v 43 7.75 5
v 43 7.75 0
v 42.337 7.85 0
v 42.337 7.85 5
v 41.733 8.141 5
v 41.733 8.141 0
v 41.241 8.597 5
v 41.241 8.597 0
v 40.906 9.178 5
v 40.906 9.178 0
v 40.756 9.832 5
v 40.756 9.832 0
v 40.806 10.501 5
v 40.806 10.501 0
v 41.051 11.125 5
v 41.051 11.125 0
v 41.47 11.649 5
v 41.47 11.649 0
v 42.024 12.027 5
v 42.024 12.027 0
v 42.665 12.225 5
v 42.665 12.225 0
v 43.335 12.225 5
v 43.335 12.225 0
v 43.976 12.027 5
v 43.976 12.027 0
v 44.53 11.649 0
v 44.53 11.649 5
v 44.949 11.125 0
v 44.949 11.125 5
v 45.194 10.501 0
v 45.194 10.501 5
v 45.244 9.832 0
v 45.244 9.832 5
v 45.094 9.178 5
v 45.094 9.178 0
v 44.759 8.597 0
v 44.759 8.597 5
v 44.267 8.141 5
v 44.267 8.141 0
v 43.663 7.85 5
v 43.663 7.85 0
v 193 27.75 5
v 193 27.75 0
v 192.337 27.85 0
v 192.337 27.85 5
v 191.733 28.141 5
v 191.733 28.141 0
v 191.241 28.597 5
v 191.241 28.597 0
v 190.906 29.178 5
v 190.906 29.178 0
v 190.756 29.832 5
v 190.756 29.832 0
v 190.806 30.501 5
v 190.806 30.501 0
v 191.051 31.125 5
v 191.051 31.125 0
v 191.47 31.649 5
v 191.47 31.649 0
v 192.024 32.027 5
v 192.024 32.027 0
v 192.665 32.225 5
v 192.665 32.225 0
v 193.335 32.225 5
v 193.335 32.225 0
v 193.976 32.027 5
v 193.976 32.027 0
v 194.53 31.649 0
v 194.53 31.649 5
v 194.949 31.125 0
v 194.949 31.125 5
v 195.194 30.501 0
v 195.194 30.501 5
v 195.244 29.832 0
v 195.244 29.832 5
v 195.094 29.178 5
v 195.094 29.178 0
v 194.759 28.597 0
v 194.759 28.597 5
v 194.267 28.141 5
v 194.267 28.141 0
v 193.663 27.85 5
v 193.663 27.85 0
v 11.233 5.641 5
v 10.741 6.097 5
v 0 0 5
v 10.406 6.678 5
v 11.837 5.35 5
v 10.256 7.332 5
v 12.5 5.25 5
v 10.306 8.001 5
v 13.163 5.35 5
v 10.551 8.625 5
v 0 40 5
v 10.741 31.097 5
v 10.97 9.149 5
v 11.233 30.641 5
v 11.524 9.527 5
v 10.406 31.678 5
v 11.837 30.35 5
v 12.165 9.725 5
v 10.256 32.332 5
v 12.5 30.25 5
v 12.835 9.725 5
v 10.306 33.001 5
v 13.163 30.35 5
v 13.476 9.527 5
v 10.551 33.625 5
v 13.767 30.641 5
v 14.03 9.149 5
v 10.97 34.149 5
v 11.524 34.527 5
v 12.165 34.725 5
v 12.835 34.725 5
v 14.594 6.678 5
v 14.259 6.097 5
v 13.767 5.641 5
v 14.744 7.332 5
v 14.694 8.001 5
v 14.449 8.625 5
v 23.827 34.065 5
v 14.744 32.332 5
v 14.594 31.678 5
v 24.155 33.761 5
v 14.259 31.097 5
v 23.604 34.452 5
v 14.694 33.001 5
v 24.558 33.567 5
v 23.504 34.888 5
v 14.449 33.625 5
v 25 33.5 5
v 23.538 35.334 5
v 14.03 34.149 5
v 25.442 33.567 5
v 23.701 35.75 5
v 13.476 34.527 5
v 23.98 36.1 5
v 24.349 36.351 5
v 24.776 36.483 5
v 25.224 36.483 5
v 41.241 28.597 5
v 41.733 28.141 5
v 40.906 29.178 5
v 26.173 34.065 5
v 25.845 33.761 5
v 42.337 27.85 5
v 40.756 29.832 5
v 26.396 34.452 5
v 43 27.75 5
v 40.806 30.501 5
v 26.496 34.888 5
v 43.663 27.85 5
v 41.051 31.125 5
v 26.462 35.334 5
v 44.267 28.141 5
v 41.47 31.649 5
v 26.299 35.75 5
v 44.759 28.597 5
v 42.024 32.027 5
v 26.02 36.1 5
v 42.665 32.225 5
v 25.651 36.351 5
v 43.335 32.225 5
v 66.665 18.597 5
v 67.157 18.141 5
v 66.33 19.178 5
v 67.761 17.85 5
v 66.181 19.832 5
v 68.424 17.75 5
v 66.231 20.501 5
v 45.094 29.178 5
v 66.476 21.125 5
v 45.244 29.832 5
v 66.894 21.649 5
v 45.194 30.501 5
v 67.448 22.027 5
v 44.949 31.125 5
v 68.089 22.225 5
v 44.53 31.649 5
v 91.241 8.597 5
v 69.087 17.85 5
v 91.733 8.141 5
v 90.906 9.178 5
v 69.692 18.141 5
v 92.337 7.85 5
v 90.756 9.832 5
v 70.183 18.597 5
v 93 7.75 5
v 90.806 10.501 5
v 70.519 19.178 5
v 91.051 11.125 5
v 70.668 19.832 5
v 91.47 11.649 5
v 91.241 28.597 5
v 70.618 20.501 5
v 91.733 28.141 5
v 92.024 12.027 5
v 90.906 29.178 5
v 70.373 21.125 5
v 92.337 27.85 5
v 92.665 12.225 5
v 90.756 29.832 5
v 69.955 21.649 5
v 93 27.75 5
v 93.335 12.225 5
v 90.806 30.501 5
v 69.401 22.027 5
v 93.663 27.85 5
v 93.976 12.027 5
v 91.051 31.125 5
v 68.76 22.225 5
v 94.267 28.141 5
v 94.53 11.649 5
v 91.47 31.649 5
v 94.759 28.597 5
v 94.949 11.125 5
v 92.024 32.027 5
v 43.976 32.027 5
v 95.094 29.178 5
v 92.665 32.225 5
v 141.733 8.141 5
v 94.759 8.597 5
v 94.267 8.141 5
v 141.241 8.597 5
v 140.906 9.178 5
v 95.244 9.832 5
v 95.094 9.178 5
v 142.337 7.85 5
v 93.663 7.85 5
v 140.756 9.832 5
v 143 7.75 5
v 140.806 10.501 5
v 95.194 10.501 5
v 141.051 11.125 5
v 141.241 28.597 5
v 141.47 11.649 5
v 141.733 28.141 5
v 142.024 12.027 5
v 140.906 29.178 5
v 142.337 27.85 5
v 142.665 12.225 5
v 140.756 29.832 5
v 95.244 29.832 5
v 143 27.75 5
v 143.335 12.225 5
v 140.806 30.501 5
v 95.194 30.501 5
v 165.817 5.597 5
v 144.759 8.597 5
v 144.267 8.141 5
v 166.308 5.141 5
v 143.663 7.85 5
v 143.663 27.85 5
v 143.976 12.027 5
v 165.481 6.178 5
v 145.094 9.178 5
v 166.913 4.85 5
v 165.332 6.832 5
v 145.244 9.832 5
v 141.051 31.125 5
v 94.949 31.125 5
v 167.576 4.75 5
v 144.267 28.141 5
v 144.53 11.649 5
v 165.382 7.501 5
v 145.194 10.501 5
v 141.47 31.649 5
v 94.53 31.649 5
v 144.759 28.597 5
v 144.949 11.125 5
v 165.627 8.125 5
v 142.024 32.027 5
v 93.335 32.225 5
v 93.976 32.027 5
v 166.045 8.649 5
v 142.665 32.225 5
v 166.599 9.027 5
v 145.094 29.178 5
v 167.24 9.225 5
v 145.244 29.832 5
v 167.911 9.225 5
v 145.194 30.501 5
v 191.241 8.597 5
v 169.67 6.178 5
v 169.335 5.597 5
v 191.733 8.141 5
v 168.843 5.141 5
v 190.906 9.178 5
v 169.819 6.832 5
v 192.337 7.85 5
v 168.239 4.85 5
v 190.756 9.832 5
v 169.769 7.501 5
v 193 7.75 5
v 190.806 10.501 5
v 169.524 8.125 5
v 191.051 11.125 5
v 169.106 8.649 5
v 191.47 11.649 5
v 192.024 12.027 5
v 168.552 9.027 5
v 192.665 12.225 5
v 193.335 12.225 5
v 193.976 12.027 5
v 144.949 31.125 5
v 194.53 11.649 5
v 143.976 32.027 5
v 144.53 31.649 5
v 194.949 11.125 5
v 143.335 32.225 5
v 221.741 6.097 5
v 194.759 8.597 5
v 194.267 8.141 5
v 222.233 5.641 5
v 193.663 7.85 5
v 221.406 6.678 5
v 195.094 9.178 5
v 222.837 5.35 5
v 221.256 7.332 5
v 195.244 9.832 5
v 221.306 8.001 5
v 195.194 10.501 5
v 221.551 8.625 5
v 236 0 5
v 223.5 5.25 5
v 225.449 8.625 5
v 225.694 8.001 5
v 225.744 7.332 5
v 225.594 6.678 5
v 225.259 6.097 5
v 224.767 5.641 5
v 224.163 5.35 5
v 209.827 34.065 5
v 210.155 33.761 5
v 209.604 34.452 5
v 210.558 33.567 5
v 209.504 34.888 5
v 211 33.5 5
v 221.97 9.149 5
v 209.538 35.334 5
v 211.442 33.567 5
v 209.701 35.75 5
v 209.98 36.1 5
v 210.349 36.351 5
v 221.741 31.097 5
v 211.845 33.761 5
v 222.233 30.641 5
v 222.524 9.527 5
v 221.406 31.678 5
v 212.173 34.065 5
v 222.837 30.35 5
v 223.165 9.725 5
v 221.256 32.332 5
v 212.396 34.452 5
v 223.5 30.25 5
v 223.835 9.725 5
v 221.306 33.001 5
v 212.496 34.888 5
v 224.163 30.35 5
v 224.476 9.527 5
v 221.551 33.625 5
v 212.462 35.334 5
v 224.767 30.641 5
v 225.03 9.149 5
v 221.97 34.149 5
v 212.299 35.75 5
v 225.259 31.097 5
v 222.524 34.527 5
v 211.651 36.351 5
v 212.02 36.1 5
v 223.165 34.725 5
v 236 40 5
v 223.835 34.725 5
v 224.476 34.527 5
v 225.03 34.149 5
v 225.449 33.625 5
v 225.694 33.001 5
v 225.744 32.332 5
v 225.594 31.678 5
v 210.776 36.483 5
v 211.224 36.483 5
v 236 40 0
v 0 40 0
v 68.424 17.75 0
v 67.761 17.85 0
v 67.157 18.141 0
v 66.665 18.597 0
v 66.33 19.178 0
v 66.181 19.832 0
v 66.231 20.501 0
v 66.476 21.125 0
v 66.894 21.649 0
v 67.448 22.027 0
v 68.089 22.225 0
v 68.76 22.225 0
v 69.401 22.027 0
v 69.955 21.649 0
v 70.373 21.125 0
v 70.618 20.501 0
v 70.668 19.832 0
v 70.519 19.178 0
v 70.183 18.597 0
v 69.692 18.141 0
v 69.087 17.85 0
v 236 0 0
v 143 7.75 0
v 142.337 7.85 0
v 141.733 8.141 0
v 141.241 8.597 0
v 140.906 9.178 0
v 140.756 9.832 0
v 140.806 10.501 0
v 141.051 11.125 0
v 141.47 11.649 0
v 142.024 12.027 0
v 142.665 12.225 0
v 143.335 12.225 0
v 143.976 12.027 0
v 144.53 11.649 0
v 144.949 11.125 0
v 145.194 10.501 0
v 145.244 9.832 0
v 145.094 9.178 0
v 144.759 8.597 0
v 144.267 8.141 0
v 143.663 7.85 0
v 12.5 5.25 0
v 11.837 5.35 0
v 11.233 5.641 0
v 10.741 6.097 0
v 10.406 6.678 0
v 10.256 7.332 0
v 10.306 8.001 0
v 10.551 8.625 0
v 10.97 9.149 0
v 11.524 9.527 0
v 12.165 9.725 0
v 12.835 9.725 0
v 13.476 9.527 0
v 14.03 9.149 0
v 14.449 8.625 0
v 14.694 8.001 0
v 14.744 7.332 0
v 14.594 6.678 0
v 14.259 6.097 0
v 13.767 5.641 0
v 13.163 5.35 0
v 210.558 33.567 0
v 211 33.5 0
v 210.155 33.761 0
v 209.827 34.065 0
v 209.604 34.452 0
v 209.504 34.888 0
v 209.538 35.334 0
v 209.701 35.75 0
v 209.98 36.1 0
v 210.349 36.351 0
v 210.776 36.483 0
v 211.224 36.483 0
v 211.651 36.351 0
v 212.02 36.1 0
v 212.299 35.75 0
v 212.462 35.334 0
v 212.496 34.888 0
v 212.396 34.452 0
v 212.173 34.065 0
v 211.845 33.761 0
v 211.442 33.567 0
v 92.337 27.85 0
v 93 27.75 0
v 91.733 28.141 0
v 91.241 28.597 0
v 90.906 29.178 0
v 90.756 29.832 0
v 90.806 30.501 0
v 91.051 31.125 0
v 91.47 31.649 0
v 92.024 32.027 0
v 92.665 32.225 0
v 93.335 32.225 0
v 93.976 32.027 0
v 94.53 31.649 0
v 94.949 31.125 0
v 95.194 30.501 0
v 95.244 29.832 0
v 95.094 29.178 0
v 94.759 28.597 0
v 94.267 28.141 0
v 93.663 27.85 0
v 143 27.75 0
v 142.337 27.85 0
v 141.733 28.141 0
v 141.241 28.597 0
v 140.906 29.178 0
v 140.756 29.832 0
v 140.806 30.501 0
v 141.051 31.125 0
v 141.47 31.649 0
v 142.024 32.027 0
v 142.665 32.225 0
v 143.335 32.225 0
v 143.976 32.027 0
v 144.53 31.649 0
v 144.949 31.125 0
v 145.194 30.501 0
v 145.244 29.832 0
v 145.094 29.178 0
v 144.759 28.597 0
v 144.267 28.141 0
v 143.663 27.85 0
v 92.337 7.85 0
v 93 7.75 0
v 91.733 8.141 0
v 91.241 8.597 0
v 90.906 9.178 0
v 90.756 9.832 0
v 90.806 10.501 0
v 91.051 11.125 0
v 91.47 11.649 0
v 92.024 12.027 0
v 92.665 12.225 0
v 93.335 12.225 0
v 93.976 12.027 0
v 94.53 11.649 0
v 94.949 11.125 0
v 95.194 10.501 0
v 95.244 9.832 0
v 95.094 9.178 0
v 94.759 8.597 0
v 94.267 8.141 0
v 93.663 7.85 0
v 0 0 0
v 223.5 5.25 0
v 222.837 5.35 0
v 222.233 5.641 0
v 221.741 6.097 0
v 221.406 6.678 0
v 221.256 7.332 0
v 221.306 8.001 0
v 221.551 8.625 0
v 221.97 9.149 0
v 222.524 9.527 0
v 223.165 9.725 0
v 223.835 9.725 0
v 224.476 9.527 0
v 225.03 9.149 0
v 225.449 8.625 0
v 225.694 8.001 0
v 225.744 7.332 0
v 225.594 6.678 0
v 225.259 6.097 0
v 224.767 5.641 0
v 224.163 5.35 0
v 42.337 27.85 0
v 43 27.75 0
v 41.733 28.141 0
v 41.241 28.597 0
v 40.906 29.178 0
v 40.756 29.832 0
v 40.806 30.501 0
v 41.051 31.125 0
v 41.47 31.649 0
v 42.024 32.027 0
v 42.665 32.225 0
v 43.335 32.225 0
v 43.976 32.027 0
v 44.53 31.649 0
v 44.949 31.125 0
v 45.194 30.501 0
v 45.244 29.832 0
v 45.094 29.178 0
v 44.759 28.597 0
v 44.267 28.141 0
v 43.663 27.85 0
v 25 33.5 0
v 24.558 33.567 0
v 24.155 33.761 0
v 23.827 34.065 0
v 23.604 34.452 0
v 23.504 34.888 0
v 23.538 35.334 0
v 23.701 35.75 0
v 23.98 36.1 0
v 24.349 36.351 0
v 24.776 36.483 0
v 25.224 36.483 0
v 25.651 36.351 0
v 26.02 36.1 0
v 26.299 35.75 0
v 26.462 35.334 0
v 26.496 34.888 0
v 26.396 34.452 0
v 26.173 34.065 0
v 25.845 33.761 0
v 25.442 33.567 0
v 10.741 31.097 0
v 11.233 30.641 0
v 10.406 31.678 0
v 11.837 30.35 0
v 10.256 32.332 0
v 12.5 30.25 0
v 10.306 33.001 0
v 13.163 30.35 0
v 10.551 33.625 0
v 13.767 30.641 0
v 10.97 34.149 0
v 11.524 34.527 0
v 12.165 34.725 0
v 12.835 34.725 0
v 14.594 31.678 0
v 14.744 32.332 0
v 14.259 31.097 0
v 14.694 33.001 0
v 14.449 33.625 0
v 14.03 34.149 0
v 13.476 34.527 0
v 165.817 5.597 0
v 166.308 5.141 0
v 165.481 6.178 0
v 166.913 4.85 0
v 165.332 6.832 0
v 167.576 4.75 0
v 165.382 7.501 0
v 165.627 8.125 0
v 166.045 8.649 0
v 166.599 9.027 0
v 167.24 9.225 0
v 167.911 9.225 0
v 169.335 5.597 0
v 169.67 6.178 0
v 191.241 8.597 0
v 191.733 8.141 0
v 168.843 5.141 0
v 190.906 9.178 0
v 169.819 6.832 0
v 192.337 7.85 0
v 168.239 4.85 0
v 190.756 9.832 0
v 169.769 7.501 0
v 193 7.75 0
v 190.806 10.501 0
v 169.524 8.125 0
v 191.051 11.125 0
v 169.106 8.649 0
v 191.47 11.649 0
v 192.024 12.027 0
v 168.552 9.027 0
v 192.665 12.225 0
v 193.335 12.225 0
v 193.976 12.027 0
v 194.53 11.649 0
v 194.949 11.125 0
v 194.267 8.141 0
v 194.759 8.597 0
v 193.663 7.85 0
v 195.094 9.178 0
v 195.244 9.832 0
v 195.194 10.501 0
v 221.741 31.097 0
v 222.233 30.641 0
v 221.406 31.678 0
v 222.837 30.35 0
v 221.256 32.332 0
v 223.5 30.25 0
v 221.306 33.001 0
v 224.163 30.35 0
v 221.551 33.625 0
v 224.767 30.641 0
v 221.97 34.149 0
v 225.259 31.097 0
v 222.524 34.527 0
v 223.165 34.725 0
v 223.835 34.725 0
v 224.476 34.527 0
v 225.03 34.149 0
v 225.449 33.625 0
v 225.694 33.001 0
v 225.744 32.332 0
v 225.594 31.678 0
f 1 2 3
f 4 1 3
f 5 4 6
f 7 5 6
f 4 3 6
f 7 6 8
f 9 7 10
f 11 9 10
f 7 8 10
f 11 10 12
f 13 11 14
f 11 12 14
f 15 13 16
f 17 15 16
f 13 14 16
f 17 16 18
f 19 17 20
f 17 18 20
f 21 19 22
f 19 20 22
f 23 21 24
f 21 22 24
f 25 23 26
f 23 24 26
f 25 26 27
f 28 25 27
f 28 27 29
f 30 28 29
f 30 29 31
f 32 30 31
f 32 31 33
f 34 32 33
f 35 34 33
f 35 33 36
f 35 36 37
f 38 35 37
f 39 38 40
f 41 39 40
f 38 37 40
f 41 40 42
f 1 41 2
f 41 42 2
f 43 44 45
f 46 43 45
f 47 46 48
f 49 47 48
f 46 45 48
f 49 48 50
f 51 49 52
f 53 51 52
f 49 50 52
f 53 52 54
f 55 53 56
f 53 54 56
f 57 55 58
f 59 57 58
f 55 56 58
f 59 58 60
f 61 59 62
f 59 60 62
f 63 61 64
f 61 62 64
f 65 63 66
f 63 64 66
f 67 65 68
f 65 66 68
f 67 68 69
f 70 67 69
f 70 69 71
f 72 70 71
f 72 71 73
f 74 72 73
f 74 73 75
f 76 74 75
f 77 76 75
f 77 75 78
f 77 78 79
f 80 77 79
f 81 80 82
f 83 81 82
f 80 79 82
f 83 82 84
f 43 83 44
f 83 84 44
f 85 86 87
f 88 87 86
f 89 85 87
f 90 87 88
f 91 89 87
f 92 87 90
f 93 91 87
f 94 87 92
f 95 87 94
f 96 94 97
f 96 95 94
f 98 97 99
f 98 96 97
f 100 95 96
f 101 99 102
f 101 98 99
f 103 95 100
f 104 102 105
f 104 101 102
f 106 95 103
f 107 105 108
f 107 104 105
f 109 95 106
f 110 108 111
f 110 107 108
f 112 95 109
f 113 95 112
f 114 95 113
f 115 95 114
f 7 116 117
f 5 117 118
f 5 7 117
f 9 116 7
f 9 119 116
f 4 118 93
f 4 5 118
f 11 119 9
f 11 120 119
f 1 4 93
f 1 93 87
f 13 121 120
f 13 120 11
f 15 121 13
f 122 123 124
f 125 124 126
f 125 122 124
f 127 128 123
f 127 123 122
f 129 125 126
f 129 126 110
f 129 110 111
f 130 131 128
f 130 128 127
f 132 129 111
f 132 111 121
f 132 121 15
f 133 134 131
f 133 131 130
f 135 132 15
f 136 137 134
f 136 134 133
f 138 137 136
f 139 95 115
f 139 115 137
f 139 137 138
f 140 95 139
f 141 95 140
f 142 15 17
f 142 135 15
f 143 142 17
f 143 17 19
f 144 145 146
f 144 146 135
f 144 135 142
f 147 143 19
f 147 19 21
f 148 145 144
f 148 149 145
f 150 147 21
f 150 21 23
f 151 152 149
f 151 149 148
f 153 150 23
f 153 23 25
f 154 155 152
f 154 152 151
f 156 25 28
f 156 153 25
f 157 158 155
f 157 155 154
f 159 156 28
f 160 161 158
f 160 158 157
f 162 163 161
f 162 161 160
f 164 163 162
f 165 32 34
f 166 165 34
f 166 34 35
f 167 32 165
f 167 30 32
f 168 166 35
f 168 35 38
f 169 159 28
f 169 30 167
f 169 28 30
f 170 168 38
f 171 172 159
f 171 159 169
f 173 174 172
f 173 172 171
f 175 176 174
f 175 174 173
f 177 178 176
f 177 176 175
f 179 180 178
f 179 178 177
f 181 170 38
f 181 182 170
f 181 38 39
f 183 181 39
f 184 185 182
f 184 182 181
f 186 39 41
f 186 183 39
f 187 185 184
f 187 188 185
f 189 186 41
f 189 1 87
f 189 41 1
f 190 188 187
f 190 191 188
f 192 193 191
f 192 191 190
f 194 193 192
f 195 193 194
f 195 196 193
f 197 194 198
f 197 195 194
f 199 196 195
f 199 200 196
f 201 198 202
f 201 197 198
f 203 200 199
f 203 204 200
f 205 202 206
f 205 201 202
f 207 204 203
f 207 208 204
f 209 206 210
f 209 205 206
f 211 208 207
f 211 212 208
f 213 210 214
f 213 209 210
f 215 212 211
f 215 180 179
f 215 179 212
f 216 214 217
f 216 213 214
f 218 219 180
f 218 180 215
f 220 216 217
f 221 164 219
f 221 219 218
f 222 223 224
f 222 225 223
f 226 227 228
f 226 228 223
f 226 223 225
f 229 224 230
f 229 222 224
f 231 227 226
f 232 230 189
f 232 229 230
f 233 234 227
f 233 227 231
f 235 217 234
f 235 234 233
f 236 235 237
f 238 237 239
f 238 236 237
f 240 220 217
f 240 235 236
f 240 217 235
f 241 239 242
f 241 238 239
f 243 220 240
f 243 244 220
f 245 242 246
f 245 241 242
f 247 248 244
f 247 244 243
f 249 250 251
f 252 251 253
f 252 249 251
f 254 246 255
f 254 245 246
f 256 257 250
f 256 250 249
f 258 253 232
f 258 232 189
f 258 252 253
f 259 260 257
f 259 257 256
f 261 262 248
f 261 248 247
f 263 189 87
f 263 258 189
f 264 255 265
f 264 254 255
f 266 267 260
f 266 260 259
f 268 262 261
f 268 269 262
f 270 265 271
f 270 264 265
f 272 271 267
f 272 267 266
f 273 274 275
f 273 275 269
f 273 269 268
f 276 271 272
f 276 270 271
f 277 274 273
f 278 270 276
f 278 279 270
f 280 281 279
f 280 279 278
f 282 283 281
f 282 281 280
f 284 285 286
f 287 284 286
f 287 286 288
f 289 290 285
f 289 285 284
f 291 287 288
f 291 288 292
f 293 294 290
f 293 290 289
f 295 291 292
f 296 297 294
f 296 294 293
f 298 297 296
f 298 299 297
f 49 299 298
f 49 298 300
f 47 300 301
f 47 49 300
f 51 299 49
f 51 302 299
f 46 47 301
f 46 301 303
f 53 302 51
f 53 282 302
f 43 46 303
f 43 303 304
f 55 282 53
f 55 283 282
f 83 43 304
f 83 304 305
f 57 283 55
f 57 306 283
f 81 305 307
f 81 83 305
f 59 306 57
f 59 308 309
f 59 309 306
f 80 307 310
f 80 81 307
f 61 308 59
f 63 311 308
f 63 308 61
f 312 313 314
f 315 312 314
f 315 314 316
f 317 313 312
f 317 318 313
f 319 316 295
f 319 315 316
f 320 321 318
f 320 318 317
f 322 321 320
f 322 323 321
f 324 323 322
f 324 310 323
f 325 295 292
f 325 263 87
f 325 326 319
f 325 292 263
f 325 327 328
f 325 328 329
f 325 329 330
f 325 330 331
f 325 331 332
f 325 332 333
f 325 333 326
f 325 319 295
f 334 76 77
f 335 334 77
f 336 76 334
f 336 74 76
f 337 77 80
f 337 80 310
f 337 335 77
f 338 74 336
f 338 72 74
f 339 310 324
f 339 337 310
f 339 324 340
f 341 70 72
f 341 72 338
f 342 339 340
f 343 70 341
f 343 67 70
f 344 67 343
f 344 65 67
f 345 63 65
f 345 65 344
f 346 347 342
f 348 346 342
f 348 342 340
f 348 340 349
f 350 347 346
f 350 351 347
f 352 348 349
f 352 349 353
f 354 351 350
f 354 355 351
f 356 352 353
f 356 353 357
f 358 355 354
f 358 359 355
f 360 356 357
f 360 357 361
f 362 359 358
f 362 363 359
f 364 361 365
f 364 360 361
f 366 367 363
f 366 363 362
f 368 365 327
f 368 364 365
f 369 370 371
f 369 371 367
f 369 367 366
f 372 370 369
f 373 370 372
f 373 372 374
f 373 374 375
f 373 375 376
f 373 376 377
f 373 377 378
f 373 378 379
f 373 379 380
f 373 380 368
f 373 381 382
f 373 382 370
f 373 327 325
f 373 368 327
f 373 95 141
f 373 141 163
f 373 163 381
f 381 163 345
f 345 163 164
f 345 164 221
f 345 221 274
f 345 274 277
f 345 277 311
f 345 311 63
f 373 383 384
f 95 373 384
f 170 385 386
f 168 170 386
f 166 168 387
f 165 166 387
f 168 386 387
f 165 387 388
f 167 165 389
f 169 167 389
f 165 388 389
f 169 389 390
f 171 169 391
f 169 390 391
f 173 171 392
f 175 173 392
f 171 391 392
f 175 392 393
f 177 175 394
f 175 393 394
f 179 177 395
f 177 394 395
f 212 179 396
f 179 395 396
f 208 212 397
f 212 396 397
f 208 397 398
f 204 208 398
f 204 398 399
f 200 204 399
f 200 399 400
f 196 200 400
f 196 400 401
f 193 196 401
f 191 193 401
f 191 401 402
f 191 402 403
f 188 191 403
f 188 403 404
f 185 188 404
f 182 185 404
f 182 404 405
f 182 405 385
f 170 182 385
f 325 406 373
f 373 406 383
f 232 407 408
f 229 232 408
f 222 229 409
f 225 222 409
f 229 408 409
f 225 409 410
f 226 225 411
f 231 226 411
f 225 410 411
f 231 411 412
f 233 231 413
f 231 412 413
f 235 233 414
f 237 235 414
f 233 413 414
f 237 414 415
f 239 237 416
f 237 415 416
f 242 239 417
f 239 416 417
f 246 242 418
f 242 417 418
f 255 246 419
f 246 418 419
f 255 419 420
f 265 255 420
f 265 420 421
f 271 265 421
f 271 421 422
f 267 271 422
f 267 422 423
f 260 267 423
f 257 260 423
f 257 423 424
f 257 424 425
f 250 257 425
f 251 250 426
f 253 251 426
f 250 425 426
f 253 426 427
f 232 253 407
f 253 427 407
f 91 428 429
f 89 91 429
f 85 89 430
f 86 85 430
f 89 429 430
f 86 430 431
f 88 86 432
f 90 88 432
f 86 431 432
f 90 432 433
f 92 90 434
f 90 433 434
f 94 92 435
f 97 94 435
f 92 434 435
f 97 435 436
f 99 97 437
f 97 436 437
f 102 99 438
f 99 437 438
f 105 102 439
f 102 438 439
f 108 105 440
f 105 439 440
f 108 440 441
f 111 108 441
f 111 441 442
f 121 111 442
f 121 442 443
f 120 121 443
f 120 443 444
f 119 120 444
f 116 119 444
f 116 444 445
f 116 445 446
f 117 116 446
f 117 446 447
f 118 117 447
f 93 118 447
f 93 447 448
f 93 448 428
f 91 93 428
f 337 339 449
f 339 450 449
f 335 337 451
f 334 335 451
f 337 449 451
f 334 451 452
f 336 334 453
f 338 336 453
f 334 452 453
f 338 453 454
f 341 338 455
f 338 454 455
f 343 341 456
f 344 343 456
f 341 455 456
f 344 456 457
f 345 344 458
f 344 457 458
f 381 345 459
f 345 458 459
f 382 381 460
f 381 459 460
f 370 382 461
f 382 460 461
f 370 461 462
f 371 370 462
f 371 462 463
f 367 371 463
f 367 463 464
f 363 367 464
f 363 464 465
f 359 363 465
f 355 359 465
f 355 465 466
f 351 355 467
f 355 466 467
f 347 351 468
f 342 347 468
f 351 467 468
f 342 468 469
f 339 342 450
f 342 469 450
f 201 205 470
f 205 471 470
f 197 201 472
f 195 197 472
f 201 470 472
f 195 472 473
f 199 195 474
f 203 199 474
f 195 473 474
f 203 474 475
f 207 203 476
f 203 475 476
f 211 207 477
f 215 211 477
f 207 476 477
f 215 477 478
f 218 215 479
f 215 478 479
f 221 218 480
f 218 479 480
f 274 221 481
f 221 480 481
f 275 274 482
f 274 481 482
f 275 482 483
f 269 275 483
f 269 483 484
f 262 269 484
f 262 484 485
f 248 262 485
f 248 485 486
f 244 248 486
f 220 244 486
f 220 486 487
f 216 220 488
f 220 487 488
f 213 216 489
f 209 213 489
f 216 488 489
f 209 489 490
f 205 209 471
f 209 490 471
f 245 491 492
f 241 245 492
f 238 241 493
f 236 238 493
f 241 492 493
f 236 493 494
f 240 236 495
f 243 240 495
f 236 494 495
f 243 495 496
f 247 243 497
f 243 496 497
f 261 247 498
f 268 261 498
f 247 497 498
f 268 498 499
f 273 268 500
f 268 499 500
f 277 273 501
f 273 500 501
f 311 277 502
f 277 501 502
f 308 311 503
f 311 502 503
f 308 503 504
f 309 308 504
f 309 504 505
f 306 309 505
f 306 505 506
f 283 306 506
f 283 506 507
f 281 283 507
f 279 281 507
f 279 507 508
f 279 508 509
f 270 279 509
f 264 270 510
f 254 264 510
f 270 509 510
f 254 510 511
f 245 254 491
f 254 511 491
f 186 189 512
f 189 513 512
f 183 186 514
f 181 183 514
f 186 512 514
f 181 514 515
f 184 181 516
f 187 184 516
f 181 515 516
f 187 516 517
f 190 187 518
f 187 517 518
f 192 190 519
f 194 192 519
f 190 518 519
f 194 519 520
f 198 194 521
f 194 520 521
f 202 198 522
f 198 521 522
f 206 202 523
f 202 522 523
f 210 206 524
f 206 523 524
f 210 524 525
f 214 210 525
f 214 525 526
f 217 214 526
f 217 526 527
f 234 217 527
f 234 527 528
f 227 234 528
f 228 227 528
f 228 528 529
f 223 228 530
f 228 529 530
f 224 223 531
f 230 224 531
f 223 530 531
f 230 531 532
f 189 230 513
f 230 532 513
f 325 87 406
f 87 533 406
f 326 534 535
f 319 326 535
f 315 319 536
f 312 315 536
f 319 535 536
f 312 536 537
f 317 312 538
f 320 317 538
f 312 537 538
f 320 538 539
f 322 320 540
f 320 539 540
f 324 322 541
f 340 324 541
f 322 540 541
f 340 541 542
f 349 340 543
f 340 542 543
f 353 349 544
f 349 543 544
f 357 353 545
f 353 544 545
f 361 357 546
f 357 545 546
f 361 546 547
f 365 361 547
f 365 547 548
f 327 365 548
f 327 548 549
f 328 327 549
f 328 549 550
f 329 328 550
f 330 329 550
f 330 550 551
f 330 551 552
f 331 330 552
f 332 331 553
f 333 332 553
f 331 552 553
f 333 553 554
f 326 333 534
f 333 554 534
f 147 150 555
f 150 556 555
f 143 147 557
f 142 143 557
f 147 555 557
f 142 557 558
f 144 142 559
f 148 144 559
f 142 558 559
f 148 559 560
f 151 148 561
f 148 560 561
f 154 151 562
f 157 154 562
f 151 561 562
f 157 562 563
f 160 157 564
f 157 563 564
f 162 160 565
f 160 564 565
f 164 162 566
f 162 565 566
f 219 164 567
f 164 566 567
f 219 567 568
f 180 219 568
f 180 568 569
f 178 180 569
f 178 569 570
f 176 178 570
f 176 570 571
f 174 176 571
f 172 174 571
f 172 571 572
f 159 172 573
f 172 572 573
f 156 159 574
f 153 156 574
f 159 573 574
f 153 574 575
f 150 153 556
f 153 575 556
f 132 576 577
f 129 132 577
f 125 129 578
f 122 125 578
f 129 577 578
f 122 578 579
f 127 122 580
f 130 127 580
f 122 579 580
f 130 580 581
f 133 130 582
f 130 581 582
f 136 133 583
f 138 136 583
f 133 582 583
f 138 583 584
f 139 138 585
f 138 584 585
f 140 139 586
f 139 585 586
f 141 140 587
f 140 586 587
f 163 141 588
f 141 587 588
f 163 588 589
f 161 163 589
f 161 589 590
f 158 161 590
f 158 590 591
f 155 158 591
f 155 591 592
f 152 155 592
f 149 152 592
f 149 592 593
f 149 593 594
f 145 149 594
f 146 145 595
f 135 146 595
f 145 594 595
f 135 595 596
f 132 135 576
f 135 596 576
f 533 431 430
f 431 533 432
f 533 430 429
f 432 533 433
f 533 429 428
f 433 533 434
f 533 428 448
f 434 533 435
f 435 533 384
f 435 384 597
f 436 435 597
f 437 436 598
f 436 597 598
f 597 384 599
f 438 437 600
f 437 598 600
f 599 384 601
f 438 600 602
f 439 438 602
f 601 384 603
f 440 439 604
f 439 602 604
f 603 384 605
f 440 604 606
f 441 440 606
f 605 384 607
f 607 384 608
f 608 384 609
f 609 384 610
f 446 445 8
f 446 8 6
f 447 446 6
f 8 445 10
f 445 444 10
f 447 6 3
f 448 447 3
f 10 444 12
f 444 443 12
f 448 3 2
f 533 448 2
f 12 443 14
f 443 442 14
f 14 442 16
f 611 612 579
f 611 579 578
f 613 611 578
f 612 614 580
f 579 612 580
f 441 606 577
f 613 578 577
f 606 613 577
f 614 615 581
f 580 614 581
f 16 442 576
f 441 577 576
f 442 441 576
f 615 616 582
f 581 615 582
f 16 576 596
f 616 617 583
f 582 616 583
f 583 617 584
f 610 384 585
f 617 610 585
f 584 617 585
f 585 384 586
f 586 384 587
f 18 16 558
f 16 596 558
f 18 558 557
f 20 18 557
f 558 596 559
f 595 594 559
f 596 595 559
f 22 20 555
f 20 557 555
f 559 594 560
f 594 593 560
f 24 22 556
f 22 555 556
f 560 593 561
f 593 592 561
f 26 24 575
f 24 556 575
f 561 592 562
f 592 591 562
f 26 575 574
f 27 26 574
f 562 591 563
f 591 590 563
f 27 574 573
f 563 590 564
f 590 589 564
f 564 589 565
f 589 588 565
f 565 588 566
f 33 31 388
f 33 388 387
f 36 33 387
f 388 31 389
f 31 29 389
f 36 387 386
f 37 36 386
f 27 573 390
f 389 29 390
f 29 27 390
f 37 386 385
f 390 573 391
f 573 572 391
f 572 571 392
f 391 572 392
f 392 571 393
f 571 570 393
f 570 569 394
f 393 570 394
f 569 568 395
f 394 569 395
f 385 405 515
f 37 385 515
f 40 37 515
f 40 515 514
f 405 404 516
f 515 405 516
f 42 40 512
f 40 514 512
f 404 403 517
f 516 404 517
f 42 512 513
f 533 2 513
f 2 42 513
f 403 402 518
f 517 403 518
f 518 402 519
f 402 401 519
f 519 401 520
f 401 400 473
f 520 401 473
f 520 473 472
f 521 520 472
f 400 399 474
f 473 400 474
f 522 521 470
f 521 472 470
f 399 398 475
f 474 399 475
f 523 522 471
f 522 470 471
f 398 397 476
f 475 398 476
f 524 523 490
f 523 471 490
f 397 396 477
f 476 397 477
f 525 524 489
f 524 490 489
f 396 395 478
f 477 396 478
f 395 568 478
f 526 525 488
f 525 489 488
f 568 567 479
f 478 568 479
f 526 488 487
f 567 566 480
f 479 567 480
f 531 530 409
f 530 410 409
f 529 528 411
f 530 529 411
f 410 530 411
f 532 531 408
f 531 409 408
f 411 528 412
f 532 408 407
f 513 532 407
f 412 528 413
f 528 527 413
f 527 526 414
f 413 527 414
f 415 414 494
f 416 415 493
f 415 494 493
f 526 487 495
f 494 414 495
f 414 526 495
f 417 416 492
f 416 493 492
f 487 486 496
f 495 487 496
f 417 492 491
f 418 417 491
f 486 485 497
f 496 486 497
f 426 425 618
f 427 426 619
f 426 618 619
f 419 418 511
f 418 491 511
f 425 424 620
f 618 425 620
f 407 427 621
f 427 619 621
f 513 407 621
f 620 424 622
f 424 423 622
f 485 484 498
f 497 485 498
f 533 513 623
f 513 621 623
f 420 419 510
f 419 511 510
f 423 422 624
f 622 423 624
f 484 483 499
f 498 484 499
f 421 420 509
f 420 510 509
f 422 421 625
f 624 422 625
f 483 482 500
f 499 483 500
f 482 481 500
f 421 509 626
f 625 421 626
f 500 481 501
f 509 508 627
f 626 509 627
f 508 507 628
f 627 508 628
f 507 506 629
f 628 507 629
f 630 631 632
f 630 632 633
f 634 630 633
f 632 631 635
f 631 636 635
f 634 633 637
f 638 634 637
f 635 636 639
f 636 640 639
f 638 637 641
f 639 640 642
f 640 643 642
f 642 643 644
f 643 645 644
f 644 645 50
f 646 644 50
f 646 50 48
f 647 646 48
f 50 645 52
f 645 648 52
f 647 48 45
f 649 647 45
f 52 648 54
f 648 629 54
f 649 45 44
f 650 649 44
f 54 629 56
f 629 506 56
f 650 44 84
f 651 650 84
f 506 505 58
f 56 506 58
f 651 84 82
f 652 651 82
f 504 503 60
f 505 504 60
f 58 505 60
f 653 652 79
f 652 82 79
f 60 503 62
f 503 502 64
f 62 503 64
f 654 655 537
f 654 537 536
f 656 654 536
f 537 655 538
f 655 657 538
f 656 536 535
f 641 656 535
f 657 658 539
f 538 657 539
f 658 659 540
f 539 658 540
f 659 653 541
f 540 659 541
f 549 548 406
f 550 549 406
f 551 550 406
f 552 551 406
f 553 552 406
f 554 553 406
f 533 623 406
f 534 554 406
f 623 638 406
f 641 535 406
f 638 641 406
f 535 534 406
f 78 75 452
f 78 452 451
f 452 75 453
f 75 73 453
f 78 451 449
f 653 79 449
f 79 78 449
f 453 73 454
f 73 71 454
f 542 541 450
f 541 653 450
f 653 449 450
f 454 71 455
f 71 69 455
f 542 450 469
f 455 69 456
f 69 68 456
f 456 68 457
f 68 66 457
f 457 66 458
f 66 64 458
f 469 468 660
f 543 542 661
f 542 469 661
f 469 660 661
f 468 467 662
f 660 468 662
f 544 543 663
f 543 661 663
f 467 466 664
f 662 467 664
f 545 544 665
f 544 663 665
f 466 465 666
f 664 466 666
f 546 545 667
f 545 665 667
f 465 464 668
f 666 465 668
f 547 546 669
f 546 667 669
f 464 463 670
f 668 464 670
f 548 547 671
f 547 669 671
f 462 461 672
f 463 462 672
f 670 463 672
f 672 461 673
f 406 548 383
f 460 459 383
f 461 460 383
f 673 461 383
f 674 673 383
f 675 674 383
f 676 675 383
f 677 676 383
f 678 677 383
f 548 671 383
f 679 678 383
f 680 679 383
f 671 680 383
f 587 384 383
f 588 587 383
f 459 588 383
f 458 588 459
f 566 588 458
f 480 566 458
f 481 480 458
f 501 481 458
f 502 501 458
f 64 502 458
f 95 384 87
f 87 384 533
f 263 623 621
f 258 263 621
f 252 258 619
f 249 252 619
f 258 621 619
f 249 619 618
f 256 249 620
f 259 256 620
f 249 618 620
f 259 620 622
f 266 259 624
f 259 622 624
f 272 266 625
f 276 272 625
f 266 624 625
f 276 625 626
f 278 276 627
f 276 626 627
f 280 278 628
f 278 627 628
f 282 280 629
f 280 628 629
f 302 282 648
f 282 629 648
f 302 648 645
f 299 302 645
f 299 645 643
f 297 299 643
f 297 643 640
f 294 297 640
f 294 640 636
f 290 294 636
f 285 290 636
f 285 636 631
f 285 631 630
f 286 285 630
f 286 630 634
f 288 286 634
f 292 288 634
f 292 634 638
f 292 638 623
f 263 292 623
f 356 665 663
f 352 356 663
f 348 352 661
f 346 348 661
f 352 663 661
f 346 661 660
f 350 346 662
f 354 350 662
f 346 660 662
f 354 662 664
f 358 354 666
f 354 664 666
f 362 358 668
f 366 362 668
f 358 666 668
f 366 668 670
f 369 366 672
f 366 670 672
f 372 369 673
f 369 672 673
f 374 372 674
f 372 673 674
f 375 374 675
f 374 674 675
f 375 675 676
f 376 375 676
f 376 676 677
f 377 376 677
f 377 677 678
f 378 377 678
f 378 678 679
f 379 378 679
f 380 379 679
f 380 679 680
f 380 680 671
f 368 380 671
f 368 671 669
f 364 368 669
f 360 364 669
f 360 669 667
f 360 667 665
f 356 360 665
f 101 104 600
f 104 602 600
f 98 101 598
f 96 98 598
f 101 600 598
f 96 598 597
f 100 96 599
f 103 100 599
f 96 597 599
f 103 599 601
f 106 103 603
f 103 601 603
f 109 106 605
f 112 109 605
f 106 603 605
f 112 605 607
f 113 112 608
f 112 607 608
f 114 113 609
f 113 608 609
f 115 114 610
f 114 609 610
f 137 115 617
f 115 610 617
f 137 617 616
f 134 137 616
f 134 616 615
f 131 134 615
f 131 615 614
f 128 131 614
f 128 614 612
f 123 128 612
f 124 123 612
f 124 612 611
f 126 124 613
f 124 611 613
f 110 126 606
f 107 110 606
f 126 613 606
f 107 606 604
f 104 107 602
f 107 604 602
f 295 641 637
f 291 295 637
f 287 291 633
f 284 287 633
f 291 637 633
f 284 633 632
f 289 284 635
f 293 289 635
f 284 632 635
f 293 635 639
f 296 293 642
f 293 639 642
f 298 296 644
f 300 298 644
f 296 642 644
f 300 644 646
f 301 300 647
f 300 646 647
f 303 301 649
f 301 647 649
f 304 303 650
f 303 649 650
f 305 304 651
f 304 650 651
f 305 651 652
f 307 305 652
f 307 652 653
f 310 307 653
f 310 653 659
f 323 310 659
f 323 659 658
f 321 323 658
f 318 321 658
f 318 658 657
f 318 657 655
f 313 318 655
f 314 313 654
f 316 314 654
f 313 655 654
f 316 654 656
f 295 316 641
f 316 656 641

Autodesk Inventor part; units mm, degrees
ref_plane "YZ Plane" through (0, 0, 0) normal (1, 0, 0) x (0, 1, 0)
ref_plane "XZ Plane" through (0, 0, 0) normal (0, 1, 0) x (-1, 0, 0)
ref_plane "XY Plane" through (0, 0, 0) normal (0, 0, 1) x (1, 0, 0)
sketch "Sketch1" plane through (0, 0, 0) normal (0, 0, 1) x (1, 0, 0)
  line L0 (0, 0) -> (236, 0)
  line L1 (236, 0) -> (236, 40)
  line L2 (236, 40) -> (0, 40)
  line L3 (0, 40) -> (0, 0)
  dimension "d0" = 236
  dimension "d1" = 40
extrude "Extrusion1" add sketch "Sketch1" along normal blind 5
sketch "Sketch2" plane through (0, 0, 5) normal (0, 0, 1) x (1, 0, 0)
  line L0 (236, 40) -> (0, 40) projected
  line L1 (0, 0) -> (236, 0) projected
  line L2 (0, 40) -> (0, 0) projected
  point P0 (43, 30)
  point P1 (43, 10)
  dimension "d4" = 10
  dimension "d6" = 43
  dimension "d40" = 20
  dimension "d41" = 10
hole "Hole1" at (43, 30, 5) at (43, 10, 5) direction (0, 0, -1) diameter 4.5 end through all clearance for "Flat Head Machine Screw" size "M4" standard "Ansi Metric M Profile"
pattern_linear "Rectangular Pattern1" count 4 spacing 50 along (1, 0, 0) of "Hole1"
sketch "Sketch3" plane through (0, 0, 5) normal (0, 0, 1) x (1, 0, 0)
  line L0 (236, 40) -> (0, 40) projected
  line L1 (0, 40) -> (0, 0) projected
  line L2 (236, 0) -> (236, 40) projected
  point P0 (68.4243, 20)
  point P1 (167.5757, 7)
  dimension "d17" = 100
  dimension "d18" = 20
  dimension "d19" = 13
  dimension "d20" = 68.4243
  dimension "d21" = 68.4243
hole "Hole2" at (68.4243, 20, 5) at (167.5757, 7, 5) direction (0, 0, -1) diameter 4.5 end through all clearance for "Flat Head Machine Screw" size "M4" standard "Ansi Metric M Profile"
sketch "Sketch4" plane through (0, 0, 5) normal (0, 0, 1) x (1, 0, 0)
  line L0 (236, 40) -> (0, 40) projected
  line L1 (0, 0) -> (236, 0) projected
  line L2 (0, 40) -> (0, 0) projected
  line L3 (236, 0) -> (236, 40) projected
  point P0 (12.5, 32.5)
  point P1 (12.5, 7.5)
  point P2 (223.5, 32.5)
  point P3 (223.5, 7.5)
  dimension "d29" = 7.5
  dimension "d30" = 7.5
  dimension "d31" = 12.5
  dimension "d32" = 12.5
hole "Hole3" at (12.5, 32.5, 5) at (12.5, 7.5, 5) at (223.5, 32.5, 5) at (223.5, 7.5, 5) direction (0, 0, -1) diameter 4.5 end through all clearance for "Flat Head Machine Screw" size "M4" standard "Ansi Metric M Profile"
sketch "Sketch5" plane through (0, 0, 5) normal (0, 0, 1) x (1, 0, 0)
  line L0 (236, 40) -> (0, 40) projected
  line L1 (236, 0) -> (236, 40) projected
  line L2 (0, 40) -> (0, 0) projected
  point P0 (25, 35)
  point P1 (211, 35)
  dimension "d42" = 5
  dimension "d51" = 25
  dimension "d52" = 25
hole "Hole4" at (25, 35, 5) at (211, 35, 5) direction (0, 0, -1) diameter 3 end through all
equation "\"d20\" = d21"
equation "\"d30\" = d29"
equation "\"d32\" = d31"
equation "\"d52\" = d51"
properties part number "Top_Slider Piece 1_4 Lanes" material "Wood (Oak)"
